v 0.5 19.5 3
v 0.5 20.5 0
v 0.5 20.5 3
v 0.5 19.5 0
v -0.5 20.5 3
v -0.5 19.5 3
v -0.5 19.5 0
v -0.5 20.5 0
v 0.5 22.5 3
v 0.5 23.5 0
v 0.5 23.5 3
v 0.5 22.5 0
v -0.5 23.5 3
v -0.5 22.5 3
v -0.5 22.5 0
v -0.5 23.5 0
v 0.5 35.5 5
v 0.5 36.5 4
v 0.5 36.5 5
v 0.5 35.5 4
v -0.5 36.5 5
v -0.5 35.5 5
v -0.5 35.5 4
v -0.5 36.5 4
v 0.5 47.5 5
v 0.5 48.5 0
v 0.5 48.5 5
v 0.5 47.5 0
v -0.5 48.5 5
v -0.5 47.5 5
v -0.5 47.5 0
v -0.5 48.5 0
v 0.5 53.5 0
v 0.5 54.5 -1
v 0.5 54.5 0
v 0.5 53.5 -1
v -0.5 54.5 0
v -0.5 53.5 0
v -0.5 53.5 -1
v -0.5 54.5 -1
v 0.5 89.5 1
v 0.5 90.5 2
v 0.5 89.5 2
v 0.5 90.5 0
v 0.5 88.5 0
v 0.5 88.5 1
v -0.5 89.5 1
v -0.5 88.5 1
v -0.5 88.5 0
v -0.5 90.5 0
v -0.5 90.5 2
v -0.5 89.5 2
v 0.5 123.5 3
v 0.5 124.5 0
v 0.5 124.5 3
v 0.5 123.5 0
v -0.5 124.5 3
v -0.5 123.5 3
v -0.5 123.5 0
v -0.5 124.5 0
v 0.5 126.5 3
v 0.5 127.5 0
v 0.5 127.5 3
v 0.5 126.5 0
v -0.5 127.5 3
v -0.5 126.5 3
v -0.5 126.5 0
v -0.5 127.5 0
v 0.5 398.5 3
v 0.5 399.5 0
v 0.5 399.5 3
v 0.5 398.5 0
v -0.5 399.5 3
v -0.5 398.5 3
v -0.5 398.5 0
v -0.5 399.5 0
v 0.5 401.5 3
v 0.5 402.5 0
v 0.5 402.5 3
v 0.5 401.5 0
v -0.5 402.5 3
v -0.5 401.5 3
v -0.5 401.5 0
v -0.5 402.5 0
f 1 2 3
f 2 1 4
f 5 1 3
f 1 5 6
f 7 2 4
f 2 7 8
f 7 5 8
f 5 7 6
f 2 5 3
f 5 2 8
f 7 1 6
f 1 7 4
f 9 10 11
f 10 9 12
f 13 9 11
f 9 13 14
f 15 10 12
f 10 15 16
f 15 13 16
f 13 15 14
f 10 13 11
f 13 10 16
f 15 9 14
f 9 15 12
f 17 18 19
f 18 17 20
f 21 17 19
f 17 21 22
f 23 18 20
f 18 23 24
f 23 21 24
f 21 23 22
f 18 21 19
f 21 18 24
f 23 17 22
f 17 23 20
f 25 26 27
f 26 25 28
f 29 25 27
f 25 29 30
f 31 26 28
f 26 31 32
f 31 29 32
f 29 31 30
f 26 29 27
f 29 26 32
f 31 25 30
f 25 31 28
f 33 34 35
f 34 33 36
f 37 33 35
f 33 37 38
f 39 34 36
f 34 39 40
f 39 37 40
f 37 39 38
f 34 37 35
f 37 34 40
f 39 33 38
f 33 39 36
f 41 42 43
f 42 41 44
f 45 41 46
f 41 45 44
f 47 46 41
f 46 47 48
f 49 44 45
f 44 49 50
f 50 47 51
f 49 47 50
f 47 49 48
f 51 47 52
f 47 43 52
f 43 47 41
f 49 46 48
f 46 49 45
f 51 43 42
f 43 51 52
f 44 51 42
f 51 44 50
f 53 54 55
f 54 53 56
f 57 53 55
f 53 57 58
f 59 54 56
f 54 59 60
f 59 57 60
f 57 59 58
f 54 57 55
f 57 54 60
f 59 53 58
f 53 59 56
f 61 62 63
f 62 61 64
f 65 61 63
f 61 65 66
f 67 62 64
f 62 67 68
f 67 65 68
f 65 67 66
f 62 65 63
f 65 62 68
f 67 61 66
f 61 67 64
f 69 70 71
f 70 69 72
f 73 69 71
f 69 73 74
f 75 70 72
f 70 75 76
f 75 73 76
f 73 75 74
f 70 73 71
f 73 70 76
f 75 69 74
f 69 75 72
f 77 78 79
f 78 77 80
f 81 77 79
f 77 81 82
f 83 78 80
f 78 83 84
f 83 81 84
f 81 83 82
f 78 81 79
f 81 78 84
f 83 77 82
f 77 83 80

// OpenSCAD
union() {
    translate([0, 20, 1.5]) cube([1, 1, 3], center=true);
    translate([0, 23, 1.5]) cube([1, 1, 3], center=true);
    translate([0, 36, 4.5]) color([1, 0, 0]) cube([1, 1, 1], center=true);
    translate([0, 48, 2.5]) cube([1, 1, 5], center=true);
    translate([0, 54, -0.5]) color([0, 0, 1]) cube([1, 1, 1], center=true);
    translate([0, 89, 0.5]) cube([1, 1, 1], center=true);
    translate([0, 90, 1.0]) cube([1, 1, 2], center=true);
    translate([0, 124, 1.5]) cube([1, 1, 3], center=true);
    translate([0, 127, 1.5]) cube([1, 1, 3], center=true);
    translate([0, 399, 1.5]) cube([1, 1, 3], center=true);
    translate([0, 402, 1.5]) cube([1, 1, 3], center=true);
}
